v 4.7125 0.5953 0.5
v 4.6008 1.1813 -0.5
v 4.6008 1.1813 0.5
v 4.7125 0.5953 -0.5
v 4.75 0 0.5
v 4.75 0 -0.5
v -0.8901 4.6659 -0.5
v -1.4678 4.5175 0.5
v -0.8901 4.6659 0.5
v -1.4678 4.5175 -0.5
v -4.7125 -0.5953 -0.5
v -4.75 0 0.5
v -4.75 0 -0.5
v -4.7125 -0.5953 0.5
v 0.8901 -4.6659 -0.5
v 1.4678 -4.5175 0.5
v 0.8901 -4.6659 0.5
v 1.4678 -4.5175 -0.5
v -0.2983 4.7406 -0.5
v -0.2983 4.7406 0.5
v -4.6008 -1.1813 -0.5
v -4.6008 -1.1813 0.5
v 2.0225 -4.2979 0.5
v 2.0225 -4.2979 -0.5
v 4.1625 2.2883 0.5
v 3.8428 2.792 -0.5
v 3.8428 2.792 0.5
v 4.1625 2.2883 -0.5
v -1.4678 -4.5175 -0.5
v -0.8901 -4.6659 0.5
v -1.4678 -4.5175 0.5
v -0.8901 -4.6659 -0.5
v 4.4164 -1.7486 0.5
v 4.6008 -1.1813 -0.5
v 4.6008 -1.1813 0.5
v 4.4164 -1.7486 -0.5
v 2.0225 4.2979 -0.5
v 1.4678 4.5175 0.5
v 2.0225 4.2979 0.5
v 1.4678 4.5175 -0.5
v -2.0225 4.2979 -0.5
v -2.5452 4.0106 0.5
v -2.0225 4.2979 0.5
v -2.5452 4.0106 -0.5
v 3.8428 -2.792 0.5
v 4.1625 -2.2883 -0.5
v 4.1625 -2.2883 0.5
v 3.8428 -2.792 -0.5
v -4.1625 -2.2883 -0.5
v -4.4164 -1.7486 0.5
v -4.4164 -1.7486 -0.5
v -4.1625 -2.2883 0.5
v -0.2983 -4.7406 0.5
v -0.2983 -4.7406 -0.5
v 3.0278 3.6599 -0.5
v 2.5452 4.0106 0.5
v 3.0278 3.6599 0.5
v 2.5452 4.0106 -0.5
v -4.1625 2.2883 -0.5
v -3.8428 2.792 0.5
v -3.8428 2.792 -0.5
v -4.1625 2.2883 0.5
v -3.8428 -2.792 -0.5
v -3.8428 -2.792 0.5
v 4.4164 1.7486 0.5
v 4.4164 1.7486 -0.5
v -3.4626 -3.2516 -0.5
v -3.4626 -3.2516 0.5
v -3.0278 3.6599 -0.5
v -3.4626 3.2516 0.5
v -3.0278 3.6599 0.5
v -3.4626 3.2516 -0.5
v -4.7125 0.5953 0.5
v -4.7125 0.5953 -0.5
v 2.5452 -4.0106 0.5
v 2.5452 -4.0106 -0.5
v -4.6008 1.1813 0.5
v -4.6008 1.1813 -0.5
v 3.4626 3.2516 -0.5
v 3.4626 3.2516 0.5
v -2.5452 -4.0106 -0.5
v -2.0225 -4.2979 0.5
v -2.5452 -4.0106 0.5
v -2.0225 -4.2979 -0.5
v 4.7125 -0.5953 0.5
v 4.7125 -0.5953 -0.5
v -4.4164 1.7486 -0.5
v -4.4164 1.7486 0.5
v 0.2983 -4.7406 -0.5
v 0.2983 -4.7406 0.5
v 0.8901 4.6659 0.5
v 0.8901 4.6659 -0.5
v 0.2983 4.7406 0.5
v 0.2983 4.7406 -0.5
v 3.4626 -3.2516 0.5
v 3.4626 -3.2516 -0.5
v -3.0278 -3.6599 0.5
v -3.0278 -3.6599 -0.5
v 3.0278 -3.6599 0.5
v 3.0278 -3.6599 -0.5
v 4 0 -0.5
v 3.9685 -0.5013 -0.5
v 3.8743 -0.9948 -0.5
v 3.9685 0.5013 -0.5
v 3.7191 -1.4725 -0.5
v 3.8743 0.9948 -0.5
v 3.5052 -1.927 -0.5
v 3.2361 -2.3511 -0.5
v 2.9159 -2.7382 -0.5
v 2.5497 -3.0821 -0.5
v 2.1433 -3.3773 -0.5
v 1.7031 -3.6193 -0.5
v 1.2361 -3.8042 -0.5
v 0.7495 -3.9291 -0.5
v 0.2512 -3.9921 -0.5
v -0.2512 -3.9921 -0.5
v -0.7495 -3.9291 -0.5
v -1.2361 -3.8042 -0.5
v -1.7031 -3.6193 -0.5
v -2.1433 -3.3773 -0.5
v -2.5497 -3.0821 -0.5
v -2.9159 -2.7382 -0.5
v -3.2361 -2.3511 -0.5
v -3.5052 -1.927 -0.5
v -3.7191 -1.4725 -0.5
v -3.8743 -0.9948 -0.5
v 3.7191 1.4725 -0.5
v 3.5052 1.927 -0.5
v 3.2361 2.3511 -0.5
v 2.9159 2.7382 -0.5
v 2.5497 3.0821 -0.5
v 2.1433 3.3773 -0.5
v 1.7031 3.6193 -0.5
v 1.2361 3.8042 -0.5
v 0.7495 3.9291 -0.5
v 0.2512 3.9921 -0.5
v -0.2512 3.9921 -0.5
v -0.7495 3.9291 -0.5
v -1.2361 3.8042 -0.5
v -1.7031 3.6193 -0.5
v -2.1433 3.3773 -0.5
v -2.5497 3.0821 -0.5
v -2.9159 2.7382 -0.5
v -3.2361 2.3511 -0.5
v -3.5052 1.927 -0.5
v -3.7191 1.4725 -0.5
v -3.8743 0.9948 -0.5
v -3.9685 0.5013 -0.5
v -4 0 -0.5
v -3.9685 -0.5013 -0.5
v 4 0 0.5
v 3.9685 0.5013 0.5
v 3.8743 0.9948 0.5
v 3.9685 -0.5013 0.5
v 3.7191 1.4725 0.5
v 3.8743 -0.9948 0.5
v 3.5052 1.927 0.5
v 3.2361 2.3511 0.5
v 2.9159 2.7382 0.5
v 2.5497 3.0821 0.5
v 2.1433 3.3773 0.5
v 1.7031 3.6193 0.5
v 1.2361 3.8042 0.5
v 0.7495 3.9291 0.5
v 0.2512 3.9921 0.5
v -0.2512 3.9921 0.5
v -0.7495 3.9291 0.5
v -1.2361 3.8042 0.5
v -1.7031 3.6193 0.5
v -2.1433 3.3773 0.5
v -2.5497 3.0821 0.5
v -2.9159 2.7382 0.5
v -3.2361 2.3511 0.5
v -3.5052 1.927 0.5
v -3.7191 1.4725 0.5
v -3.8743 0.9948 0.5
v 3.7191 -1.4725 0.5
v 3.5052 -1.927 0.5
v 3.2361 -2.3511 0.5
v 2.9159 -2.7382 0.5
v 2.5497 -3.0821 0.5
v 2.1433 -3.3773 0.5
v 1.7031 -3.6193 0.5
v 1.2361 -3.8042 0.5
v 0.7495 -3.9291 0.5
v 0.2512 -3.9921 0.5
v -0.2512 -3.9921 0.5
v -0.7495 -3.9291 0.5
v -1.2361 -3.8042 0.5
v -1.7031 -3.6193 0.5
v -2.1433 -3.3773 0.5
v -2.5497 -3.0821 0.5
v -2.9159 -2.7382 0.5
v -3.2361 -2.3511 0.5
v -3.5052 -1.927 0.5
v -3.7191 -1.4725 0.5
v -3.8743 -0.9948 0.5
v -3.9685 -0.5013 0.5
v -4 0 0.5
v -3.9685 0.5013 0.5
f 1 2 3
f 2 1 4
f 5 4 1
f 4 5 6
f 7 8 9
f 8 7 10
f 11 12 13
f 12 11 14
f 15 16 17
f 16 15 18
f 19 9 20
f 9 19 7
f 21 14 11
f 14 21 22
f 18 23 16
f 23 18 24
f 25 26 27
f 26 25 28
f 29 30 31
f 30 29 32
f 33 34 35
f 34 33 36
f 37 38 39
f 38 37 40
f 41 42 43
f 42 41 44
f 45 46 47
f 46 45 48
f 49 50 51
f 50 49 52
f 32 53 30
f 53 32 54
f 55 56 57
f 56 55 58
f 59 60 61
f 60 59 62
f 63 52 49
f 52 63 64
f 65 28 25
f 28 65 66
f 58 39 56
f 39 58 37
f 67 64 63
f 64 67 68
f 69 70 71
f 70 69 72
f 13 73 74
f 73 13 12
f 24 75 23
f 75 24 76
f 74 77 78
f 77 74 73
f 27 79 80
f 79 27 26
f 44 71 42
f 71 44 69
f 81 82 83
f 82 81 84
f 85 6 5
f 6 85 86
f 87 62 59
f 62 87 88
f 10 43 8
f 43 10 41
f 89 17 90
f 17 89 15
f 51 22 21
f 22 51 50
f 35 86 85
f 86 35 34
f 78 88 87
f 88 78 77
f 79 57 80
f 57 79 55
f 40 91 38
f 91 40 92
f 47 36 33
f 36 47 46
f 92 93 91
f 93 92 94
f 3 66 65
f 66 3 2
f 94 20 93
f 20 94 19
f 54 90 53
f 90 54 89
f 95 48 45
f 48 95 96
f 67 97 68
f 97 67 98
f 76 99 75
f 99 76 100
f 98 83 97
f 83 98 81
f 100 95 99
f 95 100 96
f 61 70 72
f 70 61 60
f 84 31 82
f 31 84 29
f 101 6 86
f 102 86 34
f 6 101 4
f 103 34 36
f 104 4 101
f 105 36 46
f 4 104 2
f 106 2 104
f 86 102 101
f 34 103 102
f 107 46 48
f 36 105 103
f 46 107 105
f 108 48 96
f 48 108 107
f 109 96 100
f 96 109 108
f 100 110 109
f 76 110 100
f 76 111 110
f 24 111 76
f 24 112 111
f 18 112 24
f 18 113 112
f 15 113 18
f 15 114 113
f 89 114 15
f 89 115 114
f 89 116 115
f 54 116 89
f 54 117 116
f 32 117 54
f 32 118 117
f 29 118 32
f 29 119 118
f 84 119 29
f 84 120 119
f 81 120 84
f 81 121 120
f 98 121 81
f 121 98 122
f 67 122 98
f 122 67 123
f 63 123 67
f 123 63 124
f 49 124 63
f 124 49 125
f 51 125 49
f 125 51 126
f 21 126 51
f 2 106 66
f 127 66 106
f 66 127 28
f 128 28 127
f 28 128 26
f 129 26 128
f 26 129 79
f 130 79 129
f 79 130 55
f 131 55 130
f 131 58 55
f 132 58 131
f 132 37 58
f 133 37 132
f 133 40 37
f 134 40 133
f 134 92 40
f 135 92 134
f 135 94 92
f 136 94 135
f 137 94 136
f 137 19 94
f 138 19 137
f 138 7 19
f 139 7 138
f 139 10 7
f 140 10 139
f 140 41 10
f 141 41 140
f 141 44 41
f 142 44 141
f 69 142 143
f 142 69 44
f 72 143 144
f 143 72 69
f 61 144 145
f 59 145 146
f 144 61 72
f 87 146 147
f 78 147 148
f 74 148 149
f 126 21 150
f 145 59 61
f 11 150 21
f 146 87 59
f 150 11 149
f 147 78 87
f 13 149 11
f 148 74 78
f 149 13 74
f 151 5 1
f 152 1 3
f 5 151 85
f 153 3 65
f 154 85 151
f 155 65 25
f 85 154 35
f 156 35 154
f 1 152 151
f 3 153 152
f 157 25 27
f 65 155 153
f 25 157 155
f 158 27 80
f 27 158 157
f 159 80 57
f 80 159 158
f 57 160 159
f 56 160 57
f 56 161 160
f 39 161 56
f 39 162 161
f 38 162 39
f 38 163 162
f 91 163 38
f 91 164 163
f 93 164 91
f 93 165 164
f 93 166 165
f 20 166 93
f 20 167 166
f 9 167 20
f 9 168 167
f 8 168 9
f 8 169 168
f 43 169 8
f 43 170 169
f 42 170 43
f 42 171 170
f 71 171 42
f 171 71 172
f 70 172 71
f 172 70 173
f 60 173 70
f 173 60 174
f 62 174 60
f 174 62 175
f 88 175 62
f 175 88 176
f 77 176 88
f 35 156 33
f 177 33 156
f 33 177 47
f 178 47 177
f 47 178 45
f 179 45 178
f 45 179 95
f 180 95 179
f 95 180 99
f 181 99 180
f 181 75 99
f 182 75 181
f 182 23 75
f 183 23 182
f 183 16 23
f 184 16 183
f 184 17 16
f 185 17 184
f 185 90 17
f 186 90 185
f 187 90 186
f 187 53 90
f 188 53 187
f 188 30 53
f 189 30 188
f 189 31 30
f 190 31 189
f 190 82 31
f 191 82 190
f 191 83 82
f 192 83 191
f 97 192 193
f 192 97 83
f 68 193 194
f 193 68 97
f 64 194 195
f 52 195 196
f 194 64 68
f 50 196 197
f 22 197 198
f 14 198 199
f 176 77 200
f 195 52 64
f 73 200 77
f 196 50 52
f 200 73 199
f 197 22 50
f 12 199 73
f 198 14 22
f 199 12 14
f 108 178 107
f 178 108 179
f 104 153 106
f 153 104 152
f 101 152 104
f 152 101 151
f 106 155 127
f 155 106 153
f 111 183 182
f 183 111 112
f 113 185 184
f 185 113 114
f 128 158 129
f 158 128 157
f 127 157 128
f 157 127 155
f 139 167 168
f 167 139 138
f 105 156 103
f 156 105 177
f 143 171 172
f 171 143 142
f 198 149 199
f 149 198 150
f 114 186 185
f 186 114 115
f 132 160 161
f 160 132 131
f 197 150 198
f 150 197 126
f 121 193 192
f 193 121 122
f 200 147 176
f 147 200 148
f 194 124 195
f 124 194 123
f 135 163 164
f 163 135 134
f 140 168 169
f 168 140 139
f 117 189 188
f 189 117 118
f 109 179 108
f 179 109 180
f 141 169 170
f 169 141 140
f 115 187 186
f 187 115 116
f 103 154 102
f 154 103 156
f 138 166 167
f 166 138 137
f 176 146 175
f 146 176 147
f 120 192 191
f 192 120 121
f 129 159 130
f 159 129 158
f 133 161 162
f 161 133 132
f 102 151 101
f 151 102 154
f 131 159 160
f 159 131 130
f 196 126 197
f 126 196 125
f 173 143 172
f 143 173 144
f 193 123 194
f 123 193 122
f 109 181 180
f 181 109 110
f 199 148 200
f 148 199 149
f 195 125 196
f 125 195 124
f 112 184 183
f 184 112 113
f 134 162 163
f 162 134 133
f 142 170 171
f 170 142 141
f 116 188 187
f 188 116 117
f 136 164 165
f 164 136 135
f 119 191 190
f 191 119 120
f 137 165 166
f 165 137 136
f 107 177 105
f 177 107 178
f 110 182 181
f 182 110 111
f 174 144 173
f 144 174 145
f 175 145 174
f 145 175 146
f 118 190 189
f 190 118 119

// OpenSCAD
$fn = 50;


difference() {
	union() {
		translate(v = [0, 0, -0.5000000000]) {
			cylinder(h = 1, r = 4.7500000000);
		}
	}
	union() {
		translate(v = [0, 0, -100.0000000000]) {
			cylinder(h = 200, r = 4.0000000000);
		}
	}
}
